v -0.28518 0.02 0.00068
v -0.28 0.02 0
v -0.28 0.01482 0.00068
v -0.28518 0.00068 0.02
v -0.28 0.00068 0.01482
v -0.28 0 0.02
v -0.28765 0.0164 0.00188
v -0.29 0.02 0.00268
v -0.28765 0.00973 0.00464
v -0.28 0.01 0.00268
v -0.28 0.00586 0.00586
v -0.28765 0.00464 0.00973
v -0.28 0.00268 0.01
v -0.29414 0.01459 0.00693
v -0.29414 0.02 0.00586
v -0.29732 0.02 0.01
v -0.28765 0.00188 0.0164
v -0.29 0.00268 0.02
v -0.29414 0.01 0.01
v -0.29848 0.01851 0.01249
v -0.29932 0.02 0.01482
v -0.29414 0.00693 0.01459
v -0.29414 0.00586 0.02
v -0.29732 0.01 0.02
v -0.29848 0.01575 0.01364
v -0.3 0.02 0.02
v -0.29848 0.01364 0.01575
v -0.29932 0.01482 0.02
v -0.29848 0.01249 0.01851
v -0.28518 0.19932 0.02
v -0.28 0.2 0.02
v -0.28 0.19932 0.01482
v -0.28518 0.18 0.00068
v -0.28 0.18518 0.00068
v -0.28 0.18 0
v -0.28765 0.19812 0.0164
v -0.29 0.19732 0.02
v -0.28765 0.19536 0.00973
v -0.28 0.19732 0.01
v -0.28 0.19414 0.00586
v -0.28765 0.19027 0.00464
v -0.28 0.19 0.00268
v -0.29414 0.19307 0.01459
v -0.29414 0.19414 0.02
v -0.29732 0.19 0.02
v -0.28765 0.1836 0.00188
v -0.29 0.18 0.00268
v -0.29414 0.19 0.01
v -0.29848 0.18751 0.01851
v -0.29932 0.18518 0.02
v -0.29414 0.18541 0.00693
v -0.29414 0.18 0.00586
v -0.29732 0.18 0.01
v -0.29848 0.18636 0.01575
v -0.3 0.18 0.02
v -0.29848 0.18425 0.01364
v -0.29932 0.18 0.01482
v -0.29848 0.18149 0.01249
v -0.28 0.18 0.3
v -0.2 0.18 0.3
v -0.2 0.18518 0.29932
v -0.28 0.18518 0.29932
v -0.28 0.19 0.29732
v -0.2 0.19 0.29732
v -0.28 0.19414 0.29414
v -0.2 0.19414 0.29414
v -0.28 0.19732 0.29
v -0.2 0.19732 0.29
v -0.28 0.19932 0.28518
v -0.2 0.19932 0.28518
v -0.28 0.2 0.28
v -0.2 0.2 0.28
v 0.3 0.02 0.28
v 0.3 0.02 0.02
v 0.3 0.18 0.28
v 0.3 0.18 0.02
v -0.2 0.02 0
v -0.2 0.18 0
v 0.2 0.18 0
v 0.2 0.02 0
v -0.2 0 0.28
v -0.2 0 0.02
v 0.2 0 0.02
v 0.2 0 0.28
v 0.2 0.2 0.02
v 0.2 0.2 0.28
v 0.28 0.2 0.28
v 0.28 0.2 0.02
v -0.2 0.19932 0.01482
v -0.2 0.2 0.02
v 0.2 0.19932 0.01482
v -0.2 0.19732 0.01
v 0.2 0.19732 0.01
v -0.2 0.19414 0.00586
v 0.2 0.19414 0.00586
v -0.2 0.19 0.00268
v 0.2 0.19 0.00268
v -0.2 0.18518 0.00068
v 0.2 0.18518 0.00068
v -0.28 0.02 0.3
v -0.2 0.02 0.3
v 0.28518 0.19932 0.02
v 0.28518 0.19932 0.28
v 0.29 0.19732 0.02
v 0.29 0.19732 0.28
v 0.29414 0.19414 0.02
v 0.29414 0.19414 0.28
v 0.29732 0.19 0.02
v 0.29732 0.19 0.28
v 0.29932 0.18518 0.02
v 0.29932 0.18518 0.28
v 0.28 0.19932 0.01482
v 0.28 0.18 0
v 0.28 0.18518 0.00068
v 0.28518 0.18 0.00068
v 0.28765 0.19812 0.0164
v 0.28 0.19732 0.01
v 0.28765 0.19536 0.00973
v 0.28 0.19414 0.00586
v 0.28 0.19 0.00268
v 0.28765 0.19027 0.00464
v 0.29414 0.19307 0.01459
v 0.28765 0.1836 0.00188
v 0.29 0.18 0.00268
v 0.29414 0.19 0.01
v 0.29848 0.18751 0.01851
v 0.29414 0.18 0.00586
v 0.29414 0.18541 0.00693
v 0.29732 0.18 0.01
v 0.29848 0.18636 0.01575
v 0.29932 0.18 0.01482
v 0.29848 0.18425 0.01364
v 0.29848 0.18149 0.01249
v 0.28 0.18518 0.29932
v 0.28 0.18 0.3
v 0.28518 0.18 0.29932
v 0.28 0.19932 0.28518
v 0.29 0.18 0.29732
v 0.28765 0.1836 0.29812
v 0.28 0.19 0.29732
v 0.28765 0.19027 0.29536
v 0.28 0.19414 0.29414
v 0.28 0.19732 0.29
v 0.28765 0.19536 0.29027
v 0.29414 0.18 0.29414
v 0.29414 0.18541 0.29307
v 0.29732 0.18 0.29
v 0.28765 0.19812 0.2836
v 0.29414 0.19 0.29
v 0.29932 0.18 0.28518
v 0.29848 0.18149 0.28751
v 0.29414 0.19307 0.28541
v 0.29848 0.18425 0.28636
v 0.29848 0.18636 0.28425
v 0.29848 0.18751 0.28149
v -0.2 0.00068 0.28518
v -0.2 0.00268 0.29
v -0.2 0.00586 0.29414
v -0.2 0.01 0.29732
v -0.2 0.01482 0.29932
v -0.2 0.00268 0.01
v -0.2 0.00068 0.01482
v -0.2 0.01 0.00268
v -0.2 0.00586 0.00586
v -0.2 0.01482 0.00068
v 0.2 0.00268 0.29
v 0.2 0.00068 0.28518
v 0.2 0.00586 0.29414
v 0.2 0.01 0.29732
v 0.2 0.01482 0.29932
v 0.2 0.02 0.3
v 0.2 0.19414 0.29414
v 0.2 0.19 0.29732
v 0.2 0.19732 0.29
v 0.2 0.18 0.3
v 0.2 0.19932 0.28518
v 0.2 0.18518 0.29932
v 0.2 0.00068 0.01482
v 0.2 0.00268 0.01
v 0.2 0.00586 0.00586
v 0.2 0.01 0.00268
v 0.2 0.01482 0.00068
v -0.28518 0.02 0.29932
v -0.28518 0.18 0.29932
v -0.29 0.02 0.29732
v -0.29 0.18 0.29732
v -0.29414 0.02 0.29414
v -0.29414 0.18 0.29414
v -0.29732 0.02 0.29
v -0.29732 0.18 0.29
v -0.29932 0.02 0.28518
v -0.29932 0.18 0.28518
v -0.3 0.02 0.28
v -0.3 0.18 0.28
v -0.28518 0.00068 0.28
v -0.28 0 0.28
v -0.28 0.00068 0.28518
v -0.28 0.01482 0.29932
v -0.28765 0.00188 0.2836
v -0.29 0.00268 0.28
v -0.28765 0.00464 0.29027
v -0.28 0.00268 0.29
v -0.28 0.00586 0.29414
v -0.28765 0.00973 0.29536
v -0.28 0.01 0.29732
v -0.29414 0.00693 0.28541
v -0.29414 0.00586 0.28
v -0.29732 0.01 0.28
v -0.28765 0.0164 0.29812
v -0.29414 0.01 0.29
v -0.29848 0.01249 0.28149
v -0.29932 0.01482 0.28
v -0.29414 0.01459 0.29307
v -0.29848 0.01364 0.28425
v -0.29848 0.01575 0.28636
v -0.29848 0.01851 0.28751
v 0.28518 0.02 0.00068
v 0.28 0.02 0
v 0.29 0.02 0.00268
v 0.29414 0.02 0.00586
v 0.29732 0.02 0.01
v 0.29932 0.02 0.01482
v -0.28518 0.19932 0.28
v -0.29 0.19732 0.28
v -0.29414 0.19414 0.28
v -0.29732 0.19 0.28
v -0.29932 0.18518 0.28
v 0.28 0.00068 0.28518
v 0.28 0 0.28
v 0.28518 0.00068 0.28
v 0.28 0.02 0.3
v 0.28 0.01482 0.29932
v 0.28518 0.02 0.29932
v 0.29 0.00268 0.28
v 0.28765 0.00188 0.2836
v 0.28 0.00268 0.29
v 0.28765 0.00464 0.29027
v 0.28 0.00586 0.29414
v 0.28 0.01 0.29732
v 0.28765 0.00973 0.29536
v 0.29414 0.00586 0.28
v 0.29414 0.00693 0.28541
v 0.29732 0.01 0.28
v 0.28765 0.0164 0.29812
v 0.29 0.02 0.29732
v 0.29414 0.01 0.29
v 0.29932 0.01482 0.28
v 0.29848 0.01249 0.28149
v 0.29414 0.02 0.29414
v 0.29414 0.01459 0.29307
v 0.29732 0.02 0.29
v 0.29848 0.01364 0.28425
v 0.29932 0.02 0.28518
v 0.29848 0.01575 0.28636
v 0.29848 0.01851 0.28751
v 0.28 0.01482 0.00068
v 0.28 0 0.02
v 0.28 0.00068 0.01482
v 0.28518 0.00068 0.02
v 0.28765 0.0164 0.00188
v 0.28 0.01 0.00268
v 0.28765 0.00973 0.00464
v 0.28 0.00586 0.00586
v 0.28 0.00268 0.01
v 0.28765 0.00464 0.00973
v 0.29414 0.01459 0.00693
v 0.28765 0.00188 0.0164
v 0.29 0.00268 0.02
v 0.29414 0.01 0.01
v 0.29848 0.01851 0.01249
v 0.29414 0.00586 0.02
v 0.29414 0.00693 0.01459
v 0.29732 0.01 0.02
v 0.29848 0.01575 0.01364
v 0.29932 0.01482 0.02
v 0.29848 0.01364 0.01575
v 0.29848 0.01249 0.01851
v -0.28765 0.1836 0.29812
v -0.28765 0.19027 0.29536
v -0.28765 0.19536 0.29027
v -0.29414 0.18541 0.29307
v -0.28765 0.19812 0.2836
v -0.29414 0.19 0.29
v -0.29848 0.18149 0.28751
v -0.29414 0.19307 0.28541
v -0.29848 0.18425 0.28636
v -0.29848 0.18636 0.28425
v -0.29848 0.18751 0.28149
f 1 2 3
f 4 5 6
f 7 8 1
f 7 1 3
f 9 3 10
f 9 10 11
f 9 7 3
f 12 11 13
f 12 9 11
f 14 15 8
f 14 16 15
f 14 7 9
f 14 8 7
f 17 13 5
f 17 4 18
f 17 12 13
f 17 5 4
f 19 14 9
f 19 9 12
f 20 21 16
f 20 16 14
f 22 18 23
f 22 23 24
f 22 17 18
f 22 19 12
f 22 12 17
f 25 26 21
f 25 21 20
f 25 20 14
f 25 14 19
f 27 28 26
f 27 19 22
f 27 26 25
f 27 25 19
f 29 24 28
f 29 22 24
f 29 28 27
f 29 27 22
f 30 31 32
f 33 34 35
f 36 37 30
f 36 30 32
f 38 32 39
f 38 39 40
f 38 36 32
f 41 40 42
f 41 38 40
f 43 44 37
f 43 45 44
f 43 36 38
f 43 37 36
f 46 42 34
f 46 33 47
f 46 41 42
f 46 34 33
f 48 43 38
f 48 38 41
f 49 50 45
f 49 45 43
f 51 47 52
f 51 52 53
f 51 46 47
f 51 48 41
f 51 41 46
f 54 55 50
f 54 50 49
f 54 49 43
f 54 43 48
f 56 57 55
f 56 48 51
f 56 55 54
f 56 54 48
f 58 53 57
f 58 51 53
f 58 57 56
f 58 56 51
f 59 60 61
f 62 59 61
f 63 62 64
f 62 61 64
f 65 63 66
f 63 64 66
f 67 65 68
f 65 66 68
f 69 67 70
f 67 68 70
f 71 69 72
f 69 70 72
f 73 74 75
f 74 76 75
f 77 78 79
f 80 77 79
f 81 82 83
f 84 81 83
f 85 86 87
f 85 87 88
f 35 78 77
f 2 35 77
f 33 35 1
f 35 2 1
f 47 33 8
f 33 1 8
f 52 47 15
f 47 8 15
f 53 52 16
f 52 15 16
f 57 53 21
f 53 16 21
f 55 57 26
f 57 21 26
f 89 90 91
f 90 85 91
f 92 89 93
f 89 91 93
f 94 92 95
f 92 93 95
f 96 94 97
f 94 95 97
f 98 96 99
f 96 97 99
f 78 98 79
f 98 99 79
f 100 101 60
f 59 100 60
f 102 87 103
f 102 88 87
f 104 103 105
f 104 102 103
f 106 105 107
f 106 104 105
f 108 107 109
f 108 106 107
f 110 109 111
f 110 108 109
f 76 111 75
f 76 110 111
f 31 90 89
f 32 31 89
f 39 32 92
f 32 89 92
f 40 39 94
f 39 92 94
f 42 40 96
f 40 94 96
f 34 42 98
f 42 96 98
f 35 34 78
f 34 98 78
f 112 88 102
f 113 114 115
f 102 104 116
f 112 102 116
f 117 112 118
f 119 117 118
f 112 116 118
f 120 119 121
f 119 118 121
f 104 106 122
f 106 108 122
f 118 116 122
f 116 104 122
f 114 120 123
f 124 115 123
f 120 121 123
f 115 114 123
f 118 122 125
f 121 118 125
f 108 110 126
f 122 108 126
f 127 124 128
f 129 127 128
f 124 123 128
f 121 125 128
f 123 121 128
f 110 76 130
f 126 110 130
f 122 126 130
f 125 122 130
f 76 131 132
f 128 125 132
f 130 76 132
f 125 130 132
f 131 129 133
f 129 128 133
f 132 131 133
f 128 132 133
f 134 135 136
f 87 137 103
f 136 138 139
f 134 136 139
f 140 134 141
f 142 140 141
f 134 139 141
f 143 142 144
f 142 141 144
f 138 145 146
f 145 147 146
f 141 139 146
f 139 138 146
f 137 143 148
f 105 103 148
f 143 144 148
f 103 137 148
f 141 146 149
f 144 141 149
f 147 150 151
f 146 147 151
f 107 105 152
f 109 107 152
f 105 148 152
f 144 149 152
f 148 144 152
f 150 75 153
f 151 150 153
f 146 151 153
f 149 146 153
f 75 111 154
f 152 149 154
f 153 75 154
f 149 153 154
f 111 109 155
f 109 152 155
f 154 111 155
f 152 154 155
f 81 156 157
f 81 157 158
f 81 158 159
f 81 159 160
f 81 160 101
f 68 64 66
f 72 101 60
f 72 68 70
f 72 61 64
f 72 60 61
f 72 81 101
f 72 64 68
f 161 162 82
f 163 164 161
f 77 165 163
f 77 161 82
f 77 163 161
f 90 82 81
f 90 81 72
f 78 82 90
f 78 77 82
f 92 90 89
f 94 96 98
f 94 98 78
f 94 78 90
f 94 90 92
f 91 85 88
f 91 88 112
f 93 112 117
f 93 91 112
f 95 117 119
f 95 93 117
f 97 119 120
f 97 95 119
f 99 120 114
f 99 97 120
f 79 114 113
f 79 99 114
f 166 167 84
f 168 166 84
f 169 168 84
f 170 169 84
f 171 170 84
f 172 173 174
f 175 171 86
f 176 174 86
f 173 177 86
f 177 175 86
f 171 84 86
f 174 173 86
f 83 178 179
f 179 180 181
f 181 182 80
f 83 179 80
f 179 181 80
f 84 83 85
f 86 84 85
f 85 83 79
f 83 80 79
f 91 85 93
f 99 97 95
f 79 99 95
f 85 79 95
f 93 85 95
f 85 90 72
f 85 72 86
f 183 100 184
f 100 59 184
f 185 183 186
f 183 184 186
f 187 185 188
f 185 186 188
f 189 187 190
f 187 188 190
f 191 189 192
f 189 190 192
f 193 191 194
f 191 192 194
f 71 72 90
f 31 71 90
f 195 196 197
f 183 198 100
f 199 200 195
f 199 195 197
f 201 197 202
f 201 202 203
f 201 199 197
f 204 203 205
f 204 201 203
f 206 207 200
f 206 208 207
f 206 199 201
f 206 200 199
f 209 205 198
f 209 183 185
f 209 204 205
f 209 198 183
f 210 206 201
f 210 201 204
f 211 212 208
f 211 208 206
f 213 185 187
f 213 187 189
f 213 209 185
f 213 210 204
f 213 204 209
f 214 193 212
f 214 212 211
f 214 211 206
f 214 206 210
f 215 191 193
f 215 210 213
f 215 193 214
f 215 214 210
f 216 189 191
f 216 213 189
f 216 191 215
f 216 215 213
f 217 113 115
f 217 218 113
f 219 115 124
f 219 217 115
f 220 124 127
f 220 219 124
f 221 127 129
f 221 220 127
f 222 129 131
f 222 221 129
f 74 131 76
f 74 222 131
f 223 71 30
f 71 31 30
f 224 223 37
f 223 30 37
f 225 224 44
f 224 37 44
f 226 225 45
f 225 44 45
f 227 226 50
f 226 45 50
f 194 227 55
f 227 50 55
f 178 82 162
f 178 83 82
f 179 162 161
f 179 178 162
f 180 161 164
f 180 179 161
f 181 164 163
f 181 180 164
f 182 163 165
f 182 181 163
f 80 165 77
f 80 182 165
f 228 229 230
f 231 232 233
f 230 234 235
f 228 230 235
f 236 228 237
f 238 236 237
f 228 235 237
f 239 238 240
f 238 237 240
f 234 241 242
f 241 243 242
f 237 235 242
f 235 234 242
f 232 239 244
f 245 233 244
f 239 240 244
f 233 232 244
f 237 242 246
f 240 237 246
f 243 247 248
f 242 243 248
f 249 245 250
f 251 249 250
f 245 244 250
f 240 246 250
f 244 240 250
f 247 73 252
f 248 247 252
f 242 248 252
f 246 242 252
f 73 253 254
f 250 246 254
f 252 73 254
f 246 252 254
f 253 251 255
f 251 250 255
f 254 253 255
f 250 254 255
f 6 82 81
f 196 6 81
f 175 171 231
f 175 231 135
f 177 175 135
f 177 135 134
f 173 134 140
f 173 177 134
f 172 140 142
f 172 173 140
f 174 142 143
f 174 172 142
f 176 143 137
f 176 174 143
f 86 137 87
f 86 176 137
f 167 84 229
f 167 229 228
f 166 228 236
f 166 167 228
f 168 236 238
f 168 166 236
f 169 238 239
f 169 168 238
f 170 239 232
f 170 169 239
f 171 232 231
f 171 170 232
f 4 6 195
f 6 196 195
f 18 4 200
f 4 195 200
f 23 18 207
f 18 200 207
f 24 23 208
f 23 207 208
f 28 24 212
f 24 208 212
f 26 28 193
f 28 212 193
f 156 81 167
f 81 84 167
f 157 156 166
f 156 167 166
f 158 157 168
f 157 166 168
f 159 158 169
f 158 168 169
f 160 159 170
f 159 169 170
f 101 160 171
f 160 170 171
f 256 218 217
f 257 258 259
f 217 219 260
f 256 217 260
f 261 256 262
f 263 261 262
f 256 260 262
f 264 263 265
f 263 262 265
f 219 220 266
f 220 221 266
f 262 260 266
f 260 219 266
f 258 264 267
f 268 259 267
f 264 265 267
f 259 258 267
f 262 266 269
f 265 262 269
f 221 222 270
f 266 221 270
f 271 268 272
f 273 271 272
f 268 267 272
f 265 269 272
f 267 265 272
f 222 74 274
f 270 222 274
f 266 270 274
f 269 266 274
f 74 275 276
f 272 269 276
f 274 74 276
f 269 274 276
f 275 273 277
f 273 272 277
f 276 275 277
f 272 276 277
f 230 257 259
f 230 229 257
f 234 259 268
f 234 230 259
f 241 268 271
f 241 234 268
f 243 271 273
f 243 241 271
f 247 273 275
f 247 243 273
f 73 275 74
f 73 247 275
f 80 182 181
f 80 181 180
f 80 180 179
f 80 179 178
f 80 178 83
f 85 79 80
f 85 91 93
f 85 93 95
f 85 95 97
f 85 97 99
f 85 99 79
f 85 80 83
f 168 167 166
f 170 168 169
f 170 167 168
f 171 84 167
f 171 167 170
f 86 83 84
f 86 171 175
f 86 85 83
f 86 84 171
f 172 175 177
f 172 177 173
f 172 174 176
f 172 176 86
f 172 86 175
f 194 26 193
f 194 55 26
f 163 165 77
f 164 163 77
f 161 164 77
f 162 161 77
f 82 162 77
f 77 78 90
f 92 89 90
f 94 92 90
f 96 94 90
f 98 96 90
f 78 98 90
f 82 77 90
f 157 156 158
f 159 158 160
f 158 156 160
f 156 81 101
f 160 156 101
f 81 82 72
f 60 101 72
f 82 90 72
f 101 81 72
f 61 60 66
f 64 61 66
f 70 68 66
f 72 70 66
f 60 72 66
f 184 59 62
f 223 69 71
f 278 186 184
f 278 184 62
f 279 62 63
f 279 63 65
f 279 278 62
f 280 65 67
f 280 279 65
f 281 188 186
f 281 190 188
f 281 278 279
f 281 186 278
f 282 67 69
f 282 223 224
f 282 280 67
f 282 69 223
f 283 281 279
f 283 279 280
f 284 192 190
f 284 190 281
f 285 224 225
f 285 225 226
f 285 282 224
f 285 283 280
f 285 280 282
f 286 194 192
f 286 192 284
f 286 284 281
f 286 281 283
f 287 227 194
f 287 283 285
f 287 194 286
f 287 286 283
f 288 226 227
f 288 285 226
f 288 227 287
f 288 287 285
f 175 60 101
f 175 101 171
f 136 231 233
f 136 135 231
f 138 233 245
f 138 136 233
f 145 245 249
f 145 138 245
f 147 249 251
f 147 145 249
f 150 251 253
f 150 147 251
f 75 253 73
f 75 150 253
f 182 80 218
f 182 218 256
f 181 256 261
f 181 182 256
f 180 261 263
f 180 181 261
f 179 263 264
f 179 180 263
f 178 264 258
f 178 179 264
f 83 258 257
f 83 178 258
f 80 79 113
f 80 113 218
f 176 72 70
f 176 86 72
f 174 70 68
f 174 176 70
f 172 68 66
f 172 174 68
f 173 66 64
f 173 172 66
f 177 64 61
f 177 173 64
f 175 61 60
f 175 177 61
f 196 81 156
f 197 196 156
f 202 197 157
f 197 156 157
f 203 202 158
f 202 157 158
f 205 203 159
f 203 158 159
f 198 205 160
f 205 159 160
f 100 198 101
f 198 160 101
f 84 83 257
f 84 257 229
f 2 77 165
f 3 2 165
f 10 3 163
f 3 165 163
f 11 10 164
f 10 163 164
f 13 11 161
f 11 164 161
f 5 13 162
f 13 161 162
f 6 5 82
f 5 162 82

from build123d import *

# Parameters (mm, degrees)
SKETCH1_W           = 0.4
SKETCH1_H           = 0.2
BOSS_EXTRUDE1_DEPTH = 0.3
FILLET1_R           = 0.02
BOSS_EXTRUDE2_DEPTH = 0.1
FILLET2_R           = 0.02


with BuildPart() as part:
    # Sketch1 → Boss-Extrude1 (new body)
    with BuildSketch(Plane.XY):
        with Locations((0, 0.1)):
            Rectangle(SKETCH1_W, SKETCH1_H)
    extrude(amount=BOSS_EXTRUDE1_DEPTH)

    # Fillet1
    fillet1_edges = [part.edges().sort_by_distance(p)[0] for p in [
        (0, 0.2, 0.3),
        (0, 0.2, 0),
        (0, 0, 0),
        (0, 0, 0.3),
    ]]
    fillet(fillet1_edges, radius=FILLET1_R)


with BuildPart() as body_2:
    # Sketch2 → Boss-Extrude2 (new body)
    with BuildSketch(Plane.ZY.offset(0.2)):
        with BuildLine():
            Line((0, 0.18), (0, 0.02))
            ThreePointArc((0, 0.02), (0.005857864, 0.005857864), (0.02, 0))
            Line((0.02, 0), (0.28, 0))
            ThreePointArc((0.28, 0), (0.294142136, 0.005857864), (0.3, 0.02))
            Line((0.3, 0.02), (0.3, 0.18))
            ThreePointArc((0.3, 0.18), (0.294142136, 0.194142136), (0.28, 0.2))
            Line((0.28, 0.2), (0.02, 0.2))
            ThreePointArc((0.02, 0.2), (0.005857864, 0.194142136), (0, 0.18))
        make_face()
    extrude(amount=BOSS_EXTRUDE2_DEPTH)

    # Fillet2
    fillet2_edges = [body_2.edges().sort_by_distance(p)[0] for p in [
        (-0.3, 0.005857864, 0.005857864),
        (-0.3, 0, 0.15),
        (-0.3, 0.005857864, 0.294142136),
        (-0.3, 0.1, 0.3),
        (-0.3, 0.194142136, 0.294142136),
        (-0.3, 0.2, 0.15),
        (-0.3, 0.194142136, 0.005857864),
        (-0.3, 0.1, 0),
    ]]
    fillet(fillet2_edges, radius=FILLET2_R)


with BuildPart() as body_3:
    # Mirror1: mirrored copy
    add(body_2.part.mirror(Plane(origin=(0, 0, 0), x_dir=(0, 0, 1), z_dir=(1, 0, 0))))


solid = Compound([part.part, body_2.part, body_3.part])
